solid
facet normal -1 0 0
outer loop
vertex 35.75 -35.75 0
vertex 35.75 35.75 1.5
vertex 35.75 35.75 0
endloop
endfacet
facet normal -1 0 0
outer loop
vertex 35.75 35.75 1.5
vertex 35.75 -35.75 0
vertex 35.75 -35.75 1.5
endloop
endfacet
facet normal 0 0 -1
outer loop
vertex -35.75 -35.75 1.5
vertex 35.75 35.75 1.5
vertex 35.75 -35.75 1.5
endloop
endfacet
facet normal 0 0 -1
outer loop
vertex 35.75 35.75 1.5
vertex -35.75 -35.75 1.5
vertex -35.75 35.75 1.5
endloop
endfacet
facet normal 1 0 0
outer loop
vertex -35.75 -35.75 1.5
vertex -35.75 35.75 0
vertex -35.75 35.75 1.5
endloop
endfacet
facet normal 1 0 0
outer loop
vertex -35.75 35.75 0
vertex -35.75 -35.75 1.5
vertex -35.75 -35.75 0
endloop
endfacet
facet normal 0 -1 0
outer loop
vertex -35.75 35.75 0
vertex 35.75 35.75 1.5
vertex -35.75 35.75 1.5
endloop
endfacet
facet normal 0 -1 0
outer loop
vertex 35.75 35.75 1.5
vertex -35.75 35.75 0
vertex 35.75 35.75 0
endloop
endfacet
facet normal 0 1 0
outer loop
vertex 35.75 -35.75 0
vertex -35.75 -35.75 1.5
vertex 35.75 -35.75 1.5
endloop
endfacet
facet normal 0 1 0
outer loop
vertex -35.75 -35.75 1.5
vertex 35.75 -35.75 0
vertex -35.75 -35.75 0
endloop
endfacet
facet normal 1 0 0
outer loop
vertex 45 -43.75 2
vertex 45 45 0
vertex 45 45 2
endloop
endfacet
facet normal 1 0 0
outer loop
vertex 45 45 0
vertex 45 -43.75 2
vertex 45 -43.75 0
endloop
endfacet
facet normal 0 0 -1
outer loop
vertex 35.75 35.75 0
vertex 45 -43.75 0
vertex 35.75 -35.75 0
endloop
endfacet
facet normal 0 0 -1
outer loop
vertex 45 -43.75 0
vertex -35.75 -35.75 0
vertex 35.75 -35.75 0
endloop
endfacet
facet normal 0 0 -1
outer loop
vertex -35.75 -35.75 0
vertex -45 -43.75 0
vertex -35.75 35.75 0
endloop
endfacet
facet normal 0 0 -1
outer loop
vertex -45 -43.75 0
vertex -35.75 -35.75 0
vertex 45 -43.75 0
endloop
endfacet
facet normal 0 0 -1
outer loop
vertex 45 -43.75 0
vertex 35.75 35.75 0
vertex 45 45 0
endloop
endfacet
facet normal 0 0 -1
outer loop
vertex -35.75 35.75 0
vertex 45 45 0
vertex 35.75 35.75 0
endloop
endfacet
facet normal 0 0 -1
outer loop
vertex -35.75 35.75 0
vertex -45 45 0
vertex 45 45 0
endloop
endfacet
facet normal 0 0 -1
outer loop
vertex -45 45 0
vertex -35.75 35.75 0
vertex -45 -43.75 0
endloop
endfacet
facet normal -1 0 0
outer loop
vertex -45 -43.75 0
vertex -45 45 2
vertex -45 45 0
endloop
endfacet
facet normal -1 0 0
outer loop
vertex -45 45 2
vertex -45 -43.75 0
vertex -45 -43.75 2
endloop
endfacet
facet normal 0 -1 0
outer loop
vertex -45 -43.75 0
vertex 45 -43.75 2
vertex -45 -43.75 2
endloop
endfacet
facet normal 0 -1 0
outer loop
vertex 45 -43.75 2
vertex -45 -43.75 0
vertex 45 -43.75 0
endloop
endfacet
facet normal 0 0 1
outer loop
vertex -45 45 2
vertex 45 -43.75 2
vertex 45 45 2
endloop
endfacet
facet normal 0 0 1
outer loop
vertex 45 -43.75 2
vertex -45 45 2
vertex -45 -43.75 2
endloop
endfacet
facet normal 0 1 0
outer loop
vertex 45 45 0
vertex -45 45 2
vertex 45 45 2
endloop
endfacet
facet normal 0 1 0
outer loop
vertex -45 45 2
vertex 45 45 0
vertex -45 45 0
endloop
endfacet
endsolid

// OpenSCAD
// Built by bench/smallmodels/features/compiler.py from a list of features.
$fn = 64;
difference() {
  union() {
    translate([0, 0, 0]) translate([-45, -45, 0]) cube([90, 90, 2]);
  }
  union() {
    translate([0, 0, -0.5]) rotate([0, 0, 0]) translate([-35.75, -35.75, 0]) cube([71.5, 71.5, 2]);
    translate([0, -45, 0]) rotate([0, 0, 0]) translate([-45, -1.25, 0]) cube([90, 2.5, 40]);
  }
}
